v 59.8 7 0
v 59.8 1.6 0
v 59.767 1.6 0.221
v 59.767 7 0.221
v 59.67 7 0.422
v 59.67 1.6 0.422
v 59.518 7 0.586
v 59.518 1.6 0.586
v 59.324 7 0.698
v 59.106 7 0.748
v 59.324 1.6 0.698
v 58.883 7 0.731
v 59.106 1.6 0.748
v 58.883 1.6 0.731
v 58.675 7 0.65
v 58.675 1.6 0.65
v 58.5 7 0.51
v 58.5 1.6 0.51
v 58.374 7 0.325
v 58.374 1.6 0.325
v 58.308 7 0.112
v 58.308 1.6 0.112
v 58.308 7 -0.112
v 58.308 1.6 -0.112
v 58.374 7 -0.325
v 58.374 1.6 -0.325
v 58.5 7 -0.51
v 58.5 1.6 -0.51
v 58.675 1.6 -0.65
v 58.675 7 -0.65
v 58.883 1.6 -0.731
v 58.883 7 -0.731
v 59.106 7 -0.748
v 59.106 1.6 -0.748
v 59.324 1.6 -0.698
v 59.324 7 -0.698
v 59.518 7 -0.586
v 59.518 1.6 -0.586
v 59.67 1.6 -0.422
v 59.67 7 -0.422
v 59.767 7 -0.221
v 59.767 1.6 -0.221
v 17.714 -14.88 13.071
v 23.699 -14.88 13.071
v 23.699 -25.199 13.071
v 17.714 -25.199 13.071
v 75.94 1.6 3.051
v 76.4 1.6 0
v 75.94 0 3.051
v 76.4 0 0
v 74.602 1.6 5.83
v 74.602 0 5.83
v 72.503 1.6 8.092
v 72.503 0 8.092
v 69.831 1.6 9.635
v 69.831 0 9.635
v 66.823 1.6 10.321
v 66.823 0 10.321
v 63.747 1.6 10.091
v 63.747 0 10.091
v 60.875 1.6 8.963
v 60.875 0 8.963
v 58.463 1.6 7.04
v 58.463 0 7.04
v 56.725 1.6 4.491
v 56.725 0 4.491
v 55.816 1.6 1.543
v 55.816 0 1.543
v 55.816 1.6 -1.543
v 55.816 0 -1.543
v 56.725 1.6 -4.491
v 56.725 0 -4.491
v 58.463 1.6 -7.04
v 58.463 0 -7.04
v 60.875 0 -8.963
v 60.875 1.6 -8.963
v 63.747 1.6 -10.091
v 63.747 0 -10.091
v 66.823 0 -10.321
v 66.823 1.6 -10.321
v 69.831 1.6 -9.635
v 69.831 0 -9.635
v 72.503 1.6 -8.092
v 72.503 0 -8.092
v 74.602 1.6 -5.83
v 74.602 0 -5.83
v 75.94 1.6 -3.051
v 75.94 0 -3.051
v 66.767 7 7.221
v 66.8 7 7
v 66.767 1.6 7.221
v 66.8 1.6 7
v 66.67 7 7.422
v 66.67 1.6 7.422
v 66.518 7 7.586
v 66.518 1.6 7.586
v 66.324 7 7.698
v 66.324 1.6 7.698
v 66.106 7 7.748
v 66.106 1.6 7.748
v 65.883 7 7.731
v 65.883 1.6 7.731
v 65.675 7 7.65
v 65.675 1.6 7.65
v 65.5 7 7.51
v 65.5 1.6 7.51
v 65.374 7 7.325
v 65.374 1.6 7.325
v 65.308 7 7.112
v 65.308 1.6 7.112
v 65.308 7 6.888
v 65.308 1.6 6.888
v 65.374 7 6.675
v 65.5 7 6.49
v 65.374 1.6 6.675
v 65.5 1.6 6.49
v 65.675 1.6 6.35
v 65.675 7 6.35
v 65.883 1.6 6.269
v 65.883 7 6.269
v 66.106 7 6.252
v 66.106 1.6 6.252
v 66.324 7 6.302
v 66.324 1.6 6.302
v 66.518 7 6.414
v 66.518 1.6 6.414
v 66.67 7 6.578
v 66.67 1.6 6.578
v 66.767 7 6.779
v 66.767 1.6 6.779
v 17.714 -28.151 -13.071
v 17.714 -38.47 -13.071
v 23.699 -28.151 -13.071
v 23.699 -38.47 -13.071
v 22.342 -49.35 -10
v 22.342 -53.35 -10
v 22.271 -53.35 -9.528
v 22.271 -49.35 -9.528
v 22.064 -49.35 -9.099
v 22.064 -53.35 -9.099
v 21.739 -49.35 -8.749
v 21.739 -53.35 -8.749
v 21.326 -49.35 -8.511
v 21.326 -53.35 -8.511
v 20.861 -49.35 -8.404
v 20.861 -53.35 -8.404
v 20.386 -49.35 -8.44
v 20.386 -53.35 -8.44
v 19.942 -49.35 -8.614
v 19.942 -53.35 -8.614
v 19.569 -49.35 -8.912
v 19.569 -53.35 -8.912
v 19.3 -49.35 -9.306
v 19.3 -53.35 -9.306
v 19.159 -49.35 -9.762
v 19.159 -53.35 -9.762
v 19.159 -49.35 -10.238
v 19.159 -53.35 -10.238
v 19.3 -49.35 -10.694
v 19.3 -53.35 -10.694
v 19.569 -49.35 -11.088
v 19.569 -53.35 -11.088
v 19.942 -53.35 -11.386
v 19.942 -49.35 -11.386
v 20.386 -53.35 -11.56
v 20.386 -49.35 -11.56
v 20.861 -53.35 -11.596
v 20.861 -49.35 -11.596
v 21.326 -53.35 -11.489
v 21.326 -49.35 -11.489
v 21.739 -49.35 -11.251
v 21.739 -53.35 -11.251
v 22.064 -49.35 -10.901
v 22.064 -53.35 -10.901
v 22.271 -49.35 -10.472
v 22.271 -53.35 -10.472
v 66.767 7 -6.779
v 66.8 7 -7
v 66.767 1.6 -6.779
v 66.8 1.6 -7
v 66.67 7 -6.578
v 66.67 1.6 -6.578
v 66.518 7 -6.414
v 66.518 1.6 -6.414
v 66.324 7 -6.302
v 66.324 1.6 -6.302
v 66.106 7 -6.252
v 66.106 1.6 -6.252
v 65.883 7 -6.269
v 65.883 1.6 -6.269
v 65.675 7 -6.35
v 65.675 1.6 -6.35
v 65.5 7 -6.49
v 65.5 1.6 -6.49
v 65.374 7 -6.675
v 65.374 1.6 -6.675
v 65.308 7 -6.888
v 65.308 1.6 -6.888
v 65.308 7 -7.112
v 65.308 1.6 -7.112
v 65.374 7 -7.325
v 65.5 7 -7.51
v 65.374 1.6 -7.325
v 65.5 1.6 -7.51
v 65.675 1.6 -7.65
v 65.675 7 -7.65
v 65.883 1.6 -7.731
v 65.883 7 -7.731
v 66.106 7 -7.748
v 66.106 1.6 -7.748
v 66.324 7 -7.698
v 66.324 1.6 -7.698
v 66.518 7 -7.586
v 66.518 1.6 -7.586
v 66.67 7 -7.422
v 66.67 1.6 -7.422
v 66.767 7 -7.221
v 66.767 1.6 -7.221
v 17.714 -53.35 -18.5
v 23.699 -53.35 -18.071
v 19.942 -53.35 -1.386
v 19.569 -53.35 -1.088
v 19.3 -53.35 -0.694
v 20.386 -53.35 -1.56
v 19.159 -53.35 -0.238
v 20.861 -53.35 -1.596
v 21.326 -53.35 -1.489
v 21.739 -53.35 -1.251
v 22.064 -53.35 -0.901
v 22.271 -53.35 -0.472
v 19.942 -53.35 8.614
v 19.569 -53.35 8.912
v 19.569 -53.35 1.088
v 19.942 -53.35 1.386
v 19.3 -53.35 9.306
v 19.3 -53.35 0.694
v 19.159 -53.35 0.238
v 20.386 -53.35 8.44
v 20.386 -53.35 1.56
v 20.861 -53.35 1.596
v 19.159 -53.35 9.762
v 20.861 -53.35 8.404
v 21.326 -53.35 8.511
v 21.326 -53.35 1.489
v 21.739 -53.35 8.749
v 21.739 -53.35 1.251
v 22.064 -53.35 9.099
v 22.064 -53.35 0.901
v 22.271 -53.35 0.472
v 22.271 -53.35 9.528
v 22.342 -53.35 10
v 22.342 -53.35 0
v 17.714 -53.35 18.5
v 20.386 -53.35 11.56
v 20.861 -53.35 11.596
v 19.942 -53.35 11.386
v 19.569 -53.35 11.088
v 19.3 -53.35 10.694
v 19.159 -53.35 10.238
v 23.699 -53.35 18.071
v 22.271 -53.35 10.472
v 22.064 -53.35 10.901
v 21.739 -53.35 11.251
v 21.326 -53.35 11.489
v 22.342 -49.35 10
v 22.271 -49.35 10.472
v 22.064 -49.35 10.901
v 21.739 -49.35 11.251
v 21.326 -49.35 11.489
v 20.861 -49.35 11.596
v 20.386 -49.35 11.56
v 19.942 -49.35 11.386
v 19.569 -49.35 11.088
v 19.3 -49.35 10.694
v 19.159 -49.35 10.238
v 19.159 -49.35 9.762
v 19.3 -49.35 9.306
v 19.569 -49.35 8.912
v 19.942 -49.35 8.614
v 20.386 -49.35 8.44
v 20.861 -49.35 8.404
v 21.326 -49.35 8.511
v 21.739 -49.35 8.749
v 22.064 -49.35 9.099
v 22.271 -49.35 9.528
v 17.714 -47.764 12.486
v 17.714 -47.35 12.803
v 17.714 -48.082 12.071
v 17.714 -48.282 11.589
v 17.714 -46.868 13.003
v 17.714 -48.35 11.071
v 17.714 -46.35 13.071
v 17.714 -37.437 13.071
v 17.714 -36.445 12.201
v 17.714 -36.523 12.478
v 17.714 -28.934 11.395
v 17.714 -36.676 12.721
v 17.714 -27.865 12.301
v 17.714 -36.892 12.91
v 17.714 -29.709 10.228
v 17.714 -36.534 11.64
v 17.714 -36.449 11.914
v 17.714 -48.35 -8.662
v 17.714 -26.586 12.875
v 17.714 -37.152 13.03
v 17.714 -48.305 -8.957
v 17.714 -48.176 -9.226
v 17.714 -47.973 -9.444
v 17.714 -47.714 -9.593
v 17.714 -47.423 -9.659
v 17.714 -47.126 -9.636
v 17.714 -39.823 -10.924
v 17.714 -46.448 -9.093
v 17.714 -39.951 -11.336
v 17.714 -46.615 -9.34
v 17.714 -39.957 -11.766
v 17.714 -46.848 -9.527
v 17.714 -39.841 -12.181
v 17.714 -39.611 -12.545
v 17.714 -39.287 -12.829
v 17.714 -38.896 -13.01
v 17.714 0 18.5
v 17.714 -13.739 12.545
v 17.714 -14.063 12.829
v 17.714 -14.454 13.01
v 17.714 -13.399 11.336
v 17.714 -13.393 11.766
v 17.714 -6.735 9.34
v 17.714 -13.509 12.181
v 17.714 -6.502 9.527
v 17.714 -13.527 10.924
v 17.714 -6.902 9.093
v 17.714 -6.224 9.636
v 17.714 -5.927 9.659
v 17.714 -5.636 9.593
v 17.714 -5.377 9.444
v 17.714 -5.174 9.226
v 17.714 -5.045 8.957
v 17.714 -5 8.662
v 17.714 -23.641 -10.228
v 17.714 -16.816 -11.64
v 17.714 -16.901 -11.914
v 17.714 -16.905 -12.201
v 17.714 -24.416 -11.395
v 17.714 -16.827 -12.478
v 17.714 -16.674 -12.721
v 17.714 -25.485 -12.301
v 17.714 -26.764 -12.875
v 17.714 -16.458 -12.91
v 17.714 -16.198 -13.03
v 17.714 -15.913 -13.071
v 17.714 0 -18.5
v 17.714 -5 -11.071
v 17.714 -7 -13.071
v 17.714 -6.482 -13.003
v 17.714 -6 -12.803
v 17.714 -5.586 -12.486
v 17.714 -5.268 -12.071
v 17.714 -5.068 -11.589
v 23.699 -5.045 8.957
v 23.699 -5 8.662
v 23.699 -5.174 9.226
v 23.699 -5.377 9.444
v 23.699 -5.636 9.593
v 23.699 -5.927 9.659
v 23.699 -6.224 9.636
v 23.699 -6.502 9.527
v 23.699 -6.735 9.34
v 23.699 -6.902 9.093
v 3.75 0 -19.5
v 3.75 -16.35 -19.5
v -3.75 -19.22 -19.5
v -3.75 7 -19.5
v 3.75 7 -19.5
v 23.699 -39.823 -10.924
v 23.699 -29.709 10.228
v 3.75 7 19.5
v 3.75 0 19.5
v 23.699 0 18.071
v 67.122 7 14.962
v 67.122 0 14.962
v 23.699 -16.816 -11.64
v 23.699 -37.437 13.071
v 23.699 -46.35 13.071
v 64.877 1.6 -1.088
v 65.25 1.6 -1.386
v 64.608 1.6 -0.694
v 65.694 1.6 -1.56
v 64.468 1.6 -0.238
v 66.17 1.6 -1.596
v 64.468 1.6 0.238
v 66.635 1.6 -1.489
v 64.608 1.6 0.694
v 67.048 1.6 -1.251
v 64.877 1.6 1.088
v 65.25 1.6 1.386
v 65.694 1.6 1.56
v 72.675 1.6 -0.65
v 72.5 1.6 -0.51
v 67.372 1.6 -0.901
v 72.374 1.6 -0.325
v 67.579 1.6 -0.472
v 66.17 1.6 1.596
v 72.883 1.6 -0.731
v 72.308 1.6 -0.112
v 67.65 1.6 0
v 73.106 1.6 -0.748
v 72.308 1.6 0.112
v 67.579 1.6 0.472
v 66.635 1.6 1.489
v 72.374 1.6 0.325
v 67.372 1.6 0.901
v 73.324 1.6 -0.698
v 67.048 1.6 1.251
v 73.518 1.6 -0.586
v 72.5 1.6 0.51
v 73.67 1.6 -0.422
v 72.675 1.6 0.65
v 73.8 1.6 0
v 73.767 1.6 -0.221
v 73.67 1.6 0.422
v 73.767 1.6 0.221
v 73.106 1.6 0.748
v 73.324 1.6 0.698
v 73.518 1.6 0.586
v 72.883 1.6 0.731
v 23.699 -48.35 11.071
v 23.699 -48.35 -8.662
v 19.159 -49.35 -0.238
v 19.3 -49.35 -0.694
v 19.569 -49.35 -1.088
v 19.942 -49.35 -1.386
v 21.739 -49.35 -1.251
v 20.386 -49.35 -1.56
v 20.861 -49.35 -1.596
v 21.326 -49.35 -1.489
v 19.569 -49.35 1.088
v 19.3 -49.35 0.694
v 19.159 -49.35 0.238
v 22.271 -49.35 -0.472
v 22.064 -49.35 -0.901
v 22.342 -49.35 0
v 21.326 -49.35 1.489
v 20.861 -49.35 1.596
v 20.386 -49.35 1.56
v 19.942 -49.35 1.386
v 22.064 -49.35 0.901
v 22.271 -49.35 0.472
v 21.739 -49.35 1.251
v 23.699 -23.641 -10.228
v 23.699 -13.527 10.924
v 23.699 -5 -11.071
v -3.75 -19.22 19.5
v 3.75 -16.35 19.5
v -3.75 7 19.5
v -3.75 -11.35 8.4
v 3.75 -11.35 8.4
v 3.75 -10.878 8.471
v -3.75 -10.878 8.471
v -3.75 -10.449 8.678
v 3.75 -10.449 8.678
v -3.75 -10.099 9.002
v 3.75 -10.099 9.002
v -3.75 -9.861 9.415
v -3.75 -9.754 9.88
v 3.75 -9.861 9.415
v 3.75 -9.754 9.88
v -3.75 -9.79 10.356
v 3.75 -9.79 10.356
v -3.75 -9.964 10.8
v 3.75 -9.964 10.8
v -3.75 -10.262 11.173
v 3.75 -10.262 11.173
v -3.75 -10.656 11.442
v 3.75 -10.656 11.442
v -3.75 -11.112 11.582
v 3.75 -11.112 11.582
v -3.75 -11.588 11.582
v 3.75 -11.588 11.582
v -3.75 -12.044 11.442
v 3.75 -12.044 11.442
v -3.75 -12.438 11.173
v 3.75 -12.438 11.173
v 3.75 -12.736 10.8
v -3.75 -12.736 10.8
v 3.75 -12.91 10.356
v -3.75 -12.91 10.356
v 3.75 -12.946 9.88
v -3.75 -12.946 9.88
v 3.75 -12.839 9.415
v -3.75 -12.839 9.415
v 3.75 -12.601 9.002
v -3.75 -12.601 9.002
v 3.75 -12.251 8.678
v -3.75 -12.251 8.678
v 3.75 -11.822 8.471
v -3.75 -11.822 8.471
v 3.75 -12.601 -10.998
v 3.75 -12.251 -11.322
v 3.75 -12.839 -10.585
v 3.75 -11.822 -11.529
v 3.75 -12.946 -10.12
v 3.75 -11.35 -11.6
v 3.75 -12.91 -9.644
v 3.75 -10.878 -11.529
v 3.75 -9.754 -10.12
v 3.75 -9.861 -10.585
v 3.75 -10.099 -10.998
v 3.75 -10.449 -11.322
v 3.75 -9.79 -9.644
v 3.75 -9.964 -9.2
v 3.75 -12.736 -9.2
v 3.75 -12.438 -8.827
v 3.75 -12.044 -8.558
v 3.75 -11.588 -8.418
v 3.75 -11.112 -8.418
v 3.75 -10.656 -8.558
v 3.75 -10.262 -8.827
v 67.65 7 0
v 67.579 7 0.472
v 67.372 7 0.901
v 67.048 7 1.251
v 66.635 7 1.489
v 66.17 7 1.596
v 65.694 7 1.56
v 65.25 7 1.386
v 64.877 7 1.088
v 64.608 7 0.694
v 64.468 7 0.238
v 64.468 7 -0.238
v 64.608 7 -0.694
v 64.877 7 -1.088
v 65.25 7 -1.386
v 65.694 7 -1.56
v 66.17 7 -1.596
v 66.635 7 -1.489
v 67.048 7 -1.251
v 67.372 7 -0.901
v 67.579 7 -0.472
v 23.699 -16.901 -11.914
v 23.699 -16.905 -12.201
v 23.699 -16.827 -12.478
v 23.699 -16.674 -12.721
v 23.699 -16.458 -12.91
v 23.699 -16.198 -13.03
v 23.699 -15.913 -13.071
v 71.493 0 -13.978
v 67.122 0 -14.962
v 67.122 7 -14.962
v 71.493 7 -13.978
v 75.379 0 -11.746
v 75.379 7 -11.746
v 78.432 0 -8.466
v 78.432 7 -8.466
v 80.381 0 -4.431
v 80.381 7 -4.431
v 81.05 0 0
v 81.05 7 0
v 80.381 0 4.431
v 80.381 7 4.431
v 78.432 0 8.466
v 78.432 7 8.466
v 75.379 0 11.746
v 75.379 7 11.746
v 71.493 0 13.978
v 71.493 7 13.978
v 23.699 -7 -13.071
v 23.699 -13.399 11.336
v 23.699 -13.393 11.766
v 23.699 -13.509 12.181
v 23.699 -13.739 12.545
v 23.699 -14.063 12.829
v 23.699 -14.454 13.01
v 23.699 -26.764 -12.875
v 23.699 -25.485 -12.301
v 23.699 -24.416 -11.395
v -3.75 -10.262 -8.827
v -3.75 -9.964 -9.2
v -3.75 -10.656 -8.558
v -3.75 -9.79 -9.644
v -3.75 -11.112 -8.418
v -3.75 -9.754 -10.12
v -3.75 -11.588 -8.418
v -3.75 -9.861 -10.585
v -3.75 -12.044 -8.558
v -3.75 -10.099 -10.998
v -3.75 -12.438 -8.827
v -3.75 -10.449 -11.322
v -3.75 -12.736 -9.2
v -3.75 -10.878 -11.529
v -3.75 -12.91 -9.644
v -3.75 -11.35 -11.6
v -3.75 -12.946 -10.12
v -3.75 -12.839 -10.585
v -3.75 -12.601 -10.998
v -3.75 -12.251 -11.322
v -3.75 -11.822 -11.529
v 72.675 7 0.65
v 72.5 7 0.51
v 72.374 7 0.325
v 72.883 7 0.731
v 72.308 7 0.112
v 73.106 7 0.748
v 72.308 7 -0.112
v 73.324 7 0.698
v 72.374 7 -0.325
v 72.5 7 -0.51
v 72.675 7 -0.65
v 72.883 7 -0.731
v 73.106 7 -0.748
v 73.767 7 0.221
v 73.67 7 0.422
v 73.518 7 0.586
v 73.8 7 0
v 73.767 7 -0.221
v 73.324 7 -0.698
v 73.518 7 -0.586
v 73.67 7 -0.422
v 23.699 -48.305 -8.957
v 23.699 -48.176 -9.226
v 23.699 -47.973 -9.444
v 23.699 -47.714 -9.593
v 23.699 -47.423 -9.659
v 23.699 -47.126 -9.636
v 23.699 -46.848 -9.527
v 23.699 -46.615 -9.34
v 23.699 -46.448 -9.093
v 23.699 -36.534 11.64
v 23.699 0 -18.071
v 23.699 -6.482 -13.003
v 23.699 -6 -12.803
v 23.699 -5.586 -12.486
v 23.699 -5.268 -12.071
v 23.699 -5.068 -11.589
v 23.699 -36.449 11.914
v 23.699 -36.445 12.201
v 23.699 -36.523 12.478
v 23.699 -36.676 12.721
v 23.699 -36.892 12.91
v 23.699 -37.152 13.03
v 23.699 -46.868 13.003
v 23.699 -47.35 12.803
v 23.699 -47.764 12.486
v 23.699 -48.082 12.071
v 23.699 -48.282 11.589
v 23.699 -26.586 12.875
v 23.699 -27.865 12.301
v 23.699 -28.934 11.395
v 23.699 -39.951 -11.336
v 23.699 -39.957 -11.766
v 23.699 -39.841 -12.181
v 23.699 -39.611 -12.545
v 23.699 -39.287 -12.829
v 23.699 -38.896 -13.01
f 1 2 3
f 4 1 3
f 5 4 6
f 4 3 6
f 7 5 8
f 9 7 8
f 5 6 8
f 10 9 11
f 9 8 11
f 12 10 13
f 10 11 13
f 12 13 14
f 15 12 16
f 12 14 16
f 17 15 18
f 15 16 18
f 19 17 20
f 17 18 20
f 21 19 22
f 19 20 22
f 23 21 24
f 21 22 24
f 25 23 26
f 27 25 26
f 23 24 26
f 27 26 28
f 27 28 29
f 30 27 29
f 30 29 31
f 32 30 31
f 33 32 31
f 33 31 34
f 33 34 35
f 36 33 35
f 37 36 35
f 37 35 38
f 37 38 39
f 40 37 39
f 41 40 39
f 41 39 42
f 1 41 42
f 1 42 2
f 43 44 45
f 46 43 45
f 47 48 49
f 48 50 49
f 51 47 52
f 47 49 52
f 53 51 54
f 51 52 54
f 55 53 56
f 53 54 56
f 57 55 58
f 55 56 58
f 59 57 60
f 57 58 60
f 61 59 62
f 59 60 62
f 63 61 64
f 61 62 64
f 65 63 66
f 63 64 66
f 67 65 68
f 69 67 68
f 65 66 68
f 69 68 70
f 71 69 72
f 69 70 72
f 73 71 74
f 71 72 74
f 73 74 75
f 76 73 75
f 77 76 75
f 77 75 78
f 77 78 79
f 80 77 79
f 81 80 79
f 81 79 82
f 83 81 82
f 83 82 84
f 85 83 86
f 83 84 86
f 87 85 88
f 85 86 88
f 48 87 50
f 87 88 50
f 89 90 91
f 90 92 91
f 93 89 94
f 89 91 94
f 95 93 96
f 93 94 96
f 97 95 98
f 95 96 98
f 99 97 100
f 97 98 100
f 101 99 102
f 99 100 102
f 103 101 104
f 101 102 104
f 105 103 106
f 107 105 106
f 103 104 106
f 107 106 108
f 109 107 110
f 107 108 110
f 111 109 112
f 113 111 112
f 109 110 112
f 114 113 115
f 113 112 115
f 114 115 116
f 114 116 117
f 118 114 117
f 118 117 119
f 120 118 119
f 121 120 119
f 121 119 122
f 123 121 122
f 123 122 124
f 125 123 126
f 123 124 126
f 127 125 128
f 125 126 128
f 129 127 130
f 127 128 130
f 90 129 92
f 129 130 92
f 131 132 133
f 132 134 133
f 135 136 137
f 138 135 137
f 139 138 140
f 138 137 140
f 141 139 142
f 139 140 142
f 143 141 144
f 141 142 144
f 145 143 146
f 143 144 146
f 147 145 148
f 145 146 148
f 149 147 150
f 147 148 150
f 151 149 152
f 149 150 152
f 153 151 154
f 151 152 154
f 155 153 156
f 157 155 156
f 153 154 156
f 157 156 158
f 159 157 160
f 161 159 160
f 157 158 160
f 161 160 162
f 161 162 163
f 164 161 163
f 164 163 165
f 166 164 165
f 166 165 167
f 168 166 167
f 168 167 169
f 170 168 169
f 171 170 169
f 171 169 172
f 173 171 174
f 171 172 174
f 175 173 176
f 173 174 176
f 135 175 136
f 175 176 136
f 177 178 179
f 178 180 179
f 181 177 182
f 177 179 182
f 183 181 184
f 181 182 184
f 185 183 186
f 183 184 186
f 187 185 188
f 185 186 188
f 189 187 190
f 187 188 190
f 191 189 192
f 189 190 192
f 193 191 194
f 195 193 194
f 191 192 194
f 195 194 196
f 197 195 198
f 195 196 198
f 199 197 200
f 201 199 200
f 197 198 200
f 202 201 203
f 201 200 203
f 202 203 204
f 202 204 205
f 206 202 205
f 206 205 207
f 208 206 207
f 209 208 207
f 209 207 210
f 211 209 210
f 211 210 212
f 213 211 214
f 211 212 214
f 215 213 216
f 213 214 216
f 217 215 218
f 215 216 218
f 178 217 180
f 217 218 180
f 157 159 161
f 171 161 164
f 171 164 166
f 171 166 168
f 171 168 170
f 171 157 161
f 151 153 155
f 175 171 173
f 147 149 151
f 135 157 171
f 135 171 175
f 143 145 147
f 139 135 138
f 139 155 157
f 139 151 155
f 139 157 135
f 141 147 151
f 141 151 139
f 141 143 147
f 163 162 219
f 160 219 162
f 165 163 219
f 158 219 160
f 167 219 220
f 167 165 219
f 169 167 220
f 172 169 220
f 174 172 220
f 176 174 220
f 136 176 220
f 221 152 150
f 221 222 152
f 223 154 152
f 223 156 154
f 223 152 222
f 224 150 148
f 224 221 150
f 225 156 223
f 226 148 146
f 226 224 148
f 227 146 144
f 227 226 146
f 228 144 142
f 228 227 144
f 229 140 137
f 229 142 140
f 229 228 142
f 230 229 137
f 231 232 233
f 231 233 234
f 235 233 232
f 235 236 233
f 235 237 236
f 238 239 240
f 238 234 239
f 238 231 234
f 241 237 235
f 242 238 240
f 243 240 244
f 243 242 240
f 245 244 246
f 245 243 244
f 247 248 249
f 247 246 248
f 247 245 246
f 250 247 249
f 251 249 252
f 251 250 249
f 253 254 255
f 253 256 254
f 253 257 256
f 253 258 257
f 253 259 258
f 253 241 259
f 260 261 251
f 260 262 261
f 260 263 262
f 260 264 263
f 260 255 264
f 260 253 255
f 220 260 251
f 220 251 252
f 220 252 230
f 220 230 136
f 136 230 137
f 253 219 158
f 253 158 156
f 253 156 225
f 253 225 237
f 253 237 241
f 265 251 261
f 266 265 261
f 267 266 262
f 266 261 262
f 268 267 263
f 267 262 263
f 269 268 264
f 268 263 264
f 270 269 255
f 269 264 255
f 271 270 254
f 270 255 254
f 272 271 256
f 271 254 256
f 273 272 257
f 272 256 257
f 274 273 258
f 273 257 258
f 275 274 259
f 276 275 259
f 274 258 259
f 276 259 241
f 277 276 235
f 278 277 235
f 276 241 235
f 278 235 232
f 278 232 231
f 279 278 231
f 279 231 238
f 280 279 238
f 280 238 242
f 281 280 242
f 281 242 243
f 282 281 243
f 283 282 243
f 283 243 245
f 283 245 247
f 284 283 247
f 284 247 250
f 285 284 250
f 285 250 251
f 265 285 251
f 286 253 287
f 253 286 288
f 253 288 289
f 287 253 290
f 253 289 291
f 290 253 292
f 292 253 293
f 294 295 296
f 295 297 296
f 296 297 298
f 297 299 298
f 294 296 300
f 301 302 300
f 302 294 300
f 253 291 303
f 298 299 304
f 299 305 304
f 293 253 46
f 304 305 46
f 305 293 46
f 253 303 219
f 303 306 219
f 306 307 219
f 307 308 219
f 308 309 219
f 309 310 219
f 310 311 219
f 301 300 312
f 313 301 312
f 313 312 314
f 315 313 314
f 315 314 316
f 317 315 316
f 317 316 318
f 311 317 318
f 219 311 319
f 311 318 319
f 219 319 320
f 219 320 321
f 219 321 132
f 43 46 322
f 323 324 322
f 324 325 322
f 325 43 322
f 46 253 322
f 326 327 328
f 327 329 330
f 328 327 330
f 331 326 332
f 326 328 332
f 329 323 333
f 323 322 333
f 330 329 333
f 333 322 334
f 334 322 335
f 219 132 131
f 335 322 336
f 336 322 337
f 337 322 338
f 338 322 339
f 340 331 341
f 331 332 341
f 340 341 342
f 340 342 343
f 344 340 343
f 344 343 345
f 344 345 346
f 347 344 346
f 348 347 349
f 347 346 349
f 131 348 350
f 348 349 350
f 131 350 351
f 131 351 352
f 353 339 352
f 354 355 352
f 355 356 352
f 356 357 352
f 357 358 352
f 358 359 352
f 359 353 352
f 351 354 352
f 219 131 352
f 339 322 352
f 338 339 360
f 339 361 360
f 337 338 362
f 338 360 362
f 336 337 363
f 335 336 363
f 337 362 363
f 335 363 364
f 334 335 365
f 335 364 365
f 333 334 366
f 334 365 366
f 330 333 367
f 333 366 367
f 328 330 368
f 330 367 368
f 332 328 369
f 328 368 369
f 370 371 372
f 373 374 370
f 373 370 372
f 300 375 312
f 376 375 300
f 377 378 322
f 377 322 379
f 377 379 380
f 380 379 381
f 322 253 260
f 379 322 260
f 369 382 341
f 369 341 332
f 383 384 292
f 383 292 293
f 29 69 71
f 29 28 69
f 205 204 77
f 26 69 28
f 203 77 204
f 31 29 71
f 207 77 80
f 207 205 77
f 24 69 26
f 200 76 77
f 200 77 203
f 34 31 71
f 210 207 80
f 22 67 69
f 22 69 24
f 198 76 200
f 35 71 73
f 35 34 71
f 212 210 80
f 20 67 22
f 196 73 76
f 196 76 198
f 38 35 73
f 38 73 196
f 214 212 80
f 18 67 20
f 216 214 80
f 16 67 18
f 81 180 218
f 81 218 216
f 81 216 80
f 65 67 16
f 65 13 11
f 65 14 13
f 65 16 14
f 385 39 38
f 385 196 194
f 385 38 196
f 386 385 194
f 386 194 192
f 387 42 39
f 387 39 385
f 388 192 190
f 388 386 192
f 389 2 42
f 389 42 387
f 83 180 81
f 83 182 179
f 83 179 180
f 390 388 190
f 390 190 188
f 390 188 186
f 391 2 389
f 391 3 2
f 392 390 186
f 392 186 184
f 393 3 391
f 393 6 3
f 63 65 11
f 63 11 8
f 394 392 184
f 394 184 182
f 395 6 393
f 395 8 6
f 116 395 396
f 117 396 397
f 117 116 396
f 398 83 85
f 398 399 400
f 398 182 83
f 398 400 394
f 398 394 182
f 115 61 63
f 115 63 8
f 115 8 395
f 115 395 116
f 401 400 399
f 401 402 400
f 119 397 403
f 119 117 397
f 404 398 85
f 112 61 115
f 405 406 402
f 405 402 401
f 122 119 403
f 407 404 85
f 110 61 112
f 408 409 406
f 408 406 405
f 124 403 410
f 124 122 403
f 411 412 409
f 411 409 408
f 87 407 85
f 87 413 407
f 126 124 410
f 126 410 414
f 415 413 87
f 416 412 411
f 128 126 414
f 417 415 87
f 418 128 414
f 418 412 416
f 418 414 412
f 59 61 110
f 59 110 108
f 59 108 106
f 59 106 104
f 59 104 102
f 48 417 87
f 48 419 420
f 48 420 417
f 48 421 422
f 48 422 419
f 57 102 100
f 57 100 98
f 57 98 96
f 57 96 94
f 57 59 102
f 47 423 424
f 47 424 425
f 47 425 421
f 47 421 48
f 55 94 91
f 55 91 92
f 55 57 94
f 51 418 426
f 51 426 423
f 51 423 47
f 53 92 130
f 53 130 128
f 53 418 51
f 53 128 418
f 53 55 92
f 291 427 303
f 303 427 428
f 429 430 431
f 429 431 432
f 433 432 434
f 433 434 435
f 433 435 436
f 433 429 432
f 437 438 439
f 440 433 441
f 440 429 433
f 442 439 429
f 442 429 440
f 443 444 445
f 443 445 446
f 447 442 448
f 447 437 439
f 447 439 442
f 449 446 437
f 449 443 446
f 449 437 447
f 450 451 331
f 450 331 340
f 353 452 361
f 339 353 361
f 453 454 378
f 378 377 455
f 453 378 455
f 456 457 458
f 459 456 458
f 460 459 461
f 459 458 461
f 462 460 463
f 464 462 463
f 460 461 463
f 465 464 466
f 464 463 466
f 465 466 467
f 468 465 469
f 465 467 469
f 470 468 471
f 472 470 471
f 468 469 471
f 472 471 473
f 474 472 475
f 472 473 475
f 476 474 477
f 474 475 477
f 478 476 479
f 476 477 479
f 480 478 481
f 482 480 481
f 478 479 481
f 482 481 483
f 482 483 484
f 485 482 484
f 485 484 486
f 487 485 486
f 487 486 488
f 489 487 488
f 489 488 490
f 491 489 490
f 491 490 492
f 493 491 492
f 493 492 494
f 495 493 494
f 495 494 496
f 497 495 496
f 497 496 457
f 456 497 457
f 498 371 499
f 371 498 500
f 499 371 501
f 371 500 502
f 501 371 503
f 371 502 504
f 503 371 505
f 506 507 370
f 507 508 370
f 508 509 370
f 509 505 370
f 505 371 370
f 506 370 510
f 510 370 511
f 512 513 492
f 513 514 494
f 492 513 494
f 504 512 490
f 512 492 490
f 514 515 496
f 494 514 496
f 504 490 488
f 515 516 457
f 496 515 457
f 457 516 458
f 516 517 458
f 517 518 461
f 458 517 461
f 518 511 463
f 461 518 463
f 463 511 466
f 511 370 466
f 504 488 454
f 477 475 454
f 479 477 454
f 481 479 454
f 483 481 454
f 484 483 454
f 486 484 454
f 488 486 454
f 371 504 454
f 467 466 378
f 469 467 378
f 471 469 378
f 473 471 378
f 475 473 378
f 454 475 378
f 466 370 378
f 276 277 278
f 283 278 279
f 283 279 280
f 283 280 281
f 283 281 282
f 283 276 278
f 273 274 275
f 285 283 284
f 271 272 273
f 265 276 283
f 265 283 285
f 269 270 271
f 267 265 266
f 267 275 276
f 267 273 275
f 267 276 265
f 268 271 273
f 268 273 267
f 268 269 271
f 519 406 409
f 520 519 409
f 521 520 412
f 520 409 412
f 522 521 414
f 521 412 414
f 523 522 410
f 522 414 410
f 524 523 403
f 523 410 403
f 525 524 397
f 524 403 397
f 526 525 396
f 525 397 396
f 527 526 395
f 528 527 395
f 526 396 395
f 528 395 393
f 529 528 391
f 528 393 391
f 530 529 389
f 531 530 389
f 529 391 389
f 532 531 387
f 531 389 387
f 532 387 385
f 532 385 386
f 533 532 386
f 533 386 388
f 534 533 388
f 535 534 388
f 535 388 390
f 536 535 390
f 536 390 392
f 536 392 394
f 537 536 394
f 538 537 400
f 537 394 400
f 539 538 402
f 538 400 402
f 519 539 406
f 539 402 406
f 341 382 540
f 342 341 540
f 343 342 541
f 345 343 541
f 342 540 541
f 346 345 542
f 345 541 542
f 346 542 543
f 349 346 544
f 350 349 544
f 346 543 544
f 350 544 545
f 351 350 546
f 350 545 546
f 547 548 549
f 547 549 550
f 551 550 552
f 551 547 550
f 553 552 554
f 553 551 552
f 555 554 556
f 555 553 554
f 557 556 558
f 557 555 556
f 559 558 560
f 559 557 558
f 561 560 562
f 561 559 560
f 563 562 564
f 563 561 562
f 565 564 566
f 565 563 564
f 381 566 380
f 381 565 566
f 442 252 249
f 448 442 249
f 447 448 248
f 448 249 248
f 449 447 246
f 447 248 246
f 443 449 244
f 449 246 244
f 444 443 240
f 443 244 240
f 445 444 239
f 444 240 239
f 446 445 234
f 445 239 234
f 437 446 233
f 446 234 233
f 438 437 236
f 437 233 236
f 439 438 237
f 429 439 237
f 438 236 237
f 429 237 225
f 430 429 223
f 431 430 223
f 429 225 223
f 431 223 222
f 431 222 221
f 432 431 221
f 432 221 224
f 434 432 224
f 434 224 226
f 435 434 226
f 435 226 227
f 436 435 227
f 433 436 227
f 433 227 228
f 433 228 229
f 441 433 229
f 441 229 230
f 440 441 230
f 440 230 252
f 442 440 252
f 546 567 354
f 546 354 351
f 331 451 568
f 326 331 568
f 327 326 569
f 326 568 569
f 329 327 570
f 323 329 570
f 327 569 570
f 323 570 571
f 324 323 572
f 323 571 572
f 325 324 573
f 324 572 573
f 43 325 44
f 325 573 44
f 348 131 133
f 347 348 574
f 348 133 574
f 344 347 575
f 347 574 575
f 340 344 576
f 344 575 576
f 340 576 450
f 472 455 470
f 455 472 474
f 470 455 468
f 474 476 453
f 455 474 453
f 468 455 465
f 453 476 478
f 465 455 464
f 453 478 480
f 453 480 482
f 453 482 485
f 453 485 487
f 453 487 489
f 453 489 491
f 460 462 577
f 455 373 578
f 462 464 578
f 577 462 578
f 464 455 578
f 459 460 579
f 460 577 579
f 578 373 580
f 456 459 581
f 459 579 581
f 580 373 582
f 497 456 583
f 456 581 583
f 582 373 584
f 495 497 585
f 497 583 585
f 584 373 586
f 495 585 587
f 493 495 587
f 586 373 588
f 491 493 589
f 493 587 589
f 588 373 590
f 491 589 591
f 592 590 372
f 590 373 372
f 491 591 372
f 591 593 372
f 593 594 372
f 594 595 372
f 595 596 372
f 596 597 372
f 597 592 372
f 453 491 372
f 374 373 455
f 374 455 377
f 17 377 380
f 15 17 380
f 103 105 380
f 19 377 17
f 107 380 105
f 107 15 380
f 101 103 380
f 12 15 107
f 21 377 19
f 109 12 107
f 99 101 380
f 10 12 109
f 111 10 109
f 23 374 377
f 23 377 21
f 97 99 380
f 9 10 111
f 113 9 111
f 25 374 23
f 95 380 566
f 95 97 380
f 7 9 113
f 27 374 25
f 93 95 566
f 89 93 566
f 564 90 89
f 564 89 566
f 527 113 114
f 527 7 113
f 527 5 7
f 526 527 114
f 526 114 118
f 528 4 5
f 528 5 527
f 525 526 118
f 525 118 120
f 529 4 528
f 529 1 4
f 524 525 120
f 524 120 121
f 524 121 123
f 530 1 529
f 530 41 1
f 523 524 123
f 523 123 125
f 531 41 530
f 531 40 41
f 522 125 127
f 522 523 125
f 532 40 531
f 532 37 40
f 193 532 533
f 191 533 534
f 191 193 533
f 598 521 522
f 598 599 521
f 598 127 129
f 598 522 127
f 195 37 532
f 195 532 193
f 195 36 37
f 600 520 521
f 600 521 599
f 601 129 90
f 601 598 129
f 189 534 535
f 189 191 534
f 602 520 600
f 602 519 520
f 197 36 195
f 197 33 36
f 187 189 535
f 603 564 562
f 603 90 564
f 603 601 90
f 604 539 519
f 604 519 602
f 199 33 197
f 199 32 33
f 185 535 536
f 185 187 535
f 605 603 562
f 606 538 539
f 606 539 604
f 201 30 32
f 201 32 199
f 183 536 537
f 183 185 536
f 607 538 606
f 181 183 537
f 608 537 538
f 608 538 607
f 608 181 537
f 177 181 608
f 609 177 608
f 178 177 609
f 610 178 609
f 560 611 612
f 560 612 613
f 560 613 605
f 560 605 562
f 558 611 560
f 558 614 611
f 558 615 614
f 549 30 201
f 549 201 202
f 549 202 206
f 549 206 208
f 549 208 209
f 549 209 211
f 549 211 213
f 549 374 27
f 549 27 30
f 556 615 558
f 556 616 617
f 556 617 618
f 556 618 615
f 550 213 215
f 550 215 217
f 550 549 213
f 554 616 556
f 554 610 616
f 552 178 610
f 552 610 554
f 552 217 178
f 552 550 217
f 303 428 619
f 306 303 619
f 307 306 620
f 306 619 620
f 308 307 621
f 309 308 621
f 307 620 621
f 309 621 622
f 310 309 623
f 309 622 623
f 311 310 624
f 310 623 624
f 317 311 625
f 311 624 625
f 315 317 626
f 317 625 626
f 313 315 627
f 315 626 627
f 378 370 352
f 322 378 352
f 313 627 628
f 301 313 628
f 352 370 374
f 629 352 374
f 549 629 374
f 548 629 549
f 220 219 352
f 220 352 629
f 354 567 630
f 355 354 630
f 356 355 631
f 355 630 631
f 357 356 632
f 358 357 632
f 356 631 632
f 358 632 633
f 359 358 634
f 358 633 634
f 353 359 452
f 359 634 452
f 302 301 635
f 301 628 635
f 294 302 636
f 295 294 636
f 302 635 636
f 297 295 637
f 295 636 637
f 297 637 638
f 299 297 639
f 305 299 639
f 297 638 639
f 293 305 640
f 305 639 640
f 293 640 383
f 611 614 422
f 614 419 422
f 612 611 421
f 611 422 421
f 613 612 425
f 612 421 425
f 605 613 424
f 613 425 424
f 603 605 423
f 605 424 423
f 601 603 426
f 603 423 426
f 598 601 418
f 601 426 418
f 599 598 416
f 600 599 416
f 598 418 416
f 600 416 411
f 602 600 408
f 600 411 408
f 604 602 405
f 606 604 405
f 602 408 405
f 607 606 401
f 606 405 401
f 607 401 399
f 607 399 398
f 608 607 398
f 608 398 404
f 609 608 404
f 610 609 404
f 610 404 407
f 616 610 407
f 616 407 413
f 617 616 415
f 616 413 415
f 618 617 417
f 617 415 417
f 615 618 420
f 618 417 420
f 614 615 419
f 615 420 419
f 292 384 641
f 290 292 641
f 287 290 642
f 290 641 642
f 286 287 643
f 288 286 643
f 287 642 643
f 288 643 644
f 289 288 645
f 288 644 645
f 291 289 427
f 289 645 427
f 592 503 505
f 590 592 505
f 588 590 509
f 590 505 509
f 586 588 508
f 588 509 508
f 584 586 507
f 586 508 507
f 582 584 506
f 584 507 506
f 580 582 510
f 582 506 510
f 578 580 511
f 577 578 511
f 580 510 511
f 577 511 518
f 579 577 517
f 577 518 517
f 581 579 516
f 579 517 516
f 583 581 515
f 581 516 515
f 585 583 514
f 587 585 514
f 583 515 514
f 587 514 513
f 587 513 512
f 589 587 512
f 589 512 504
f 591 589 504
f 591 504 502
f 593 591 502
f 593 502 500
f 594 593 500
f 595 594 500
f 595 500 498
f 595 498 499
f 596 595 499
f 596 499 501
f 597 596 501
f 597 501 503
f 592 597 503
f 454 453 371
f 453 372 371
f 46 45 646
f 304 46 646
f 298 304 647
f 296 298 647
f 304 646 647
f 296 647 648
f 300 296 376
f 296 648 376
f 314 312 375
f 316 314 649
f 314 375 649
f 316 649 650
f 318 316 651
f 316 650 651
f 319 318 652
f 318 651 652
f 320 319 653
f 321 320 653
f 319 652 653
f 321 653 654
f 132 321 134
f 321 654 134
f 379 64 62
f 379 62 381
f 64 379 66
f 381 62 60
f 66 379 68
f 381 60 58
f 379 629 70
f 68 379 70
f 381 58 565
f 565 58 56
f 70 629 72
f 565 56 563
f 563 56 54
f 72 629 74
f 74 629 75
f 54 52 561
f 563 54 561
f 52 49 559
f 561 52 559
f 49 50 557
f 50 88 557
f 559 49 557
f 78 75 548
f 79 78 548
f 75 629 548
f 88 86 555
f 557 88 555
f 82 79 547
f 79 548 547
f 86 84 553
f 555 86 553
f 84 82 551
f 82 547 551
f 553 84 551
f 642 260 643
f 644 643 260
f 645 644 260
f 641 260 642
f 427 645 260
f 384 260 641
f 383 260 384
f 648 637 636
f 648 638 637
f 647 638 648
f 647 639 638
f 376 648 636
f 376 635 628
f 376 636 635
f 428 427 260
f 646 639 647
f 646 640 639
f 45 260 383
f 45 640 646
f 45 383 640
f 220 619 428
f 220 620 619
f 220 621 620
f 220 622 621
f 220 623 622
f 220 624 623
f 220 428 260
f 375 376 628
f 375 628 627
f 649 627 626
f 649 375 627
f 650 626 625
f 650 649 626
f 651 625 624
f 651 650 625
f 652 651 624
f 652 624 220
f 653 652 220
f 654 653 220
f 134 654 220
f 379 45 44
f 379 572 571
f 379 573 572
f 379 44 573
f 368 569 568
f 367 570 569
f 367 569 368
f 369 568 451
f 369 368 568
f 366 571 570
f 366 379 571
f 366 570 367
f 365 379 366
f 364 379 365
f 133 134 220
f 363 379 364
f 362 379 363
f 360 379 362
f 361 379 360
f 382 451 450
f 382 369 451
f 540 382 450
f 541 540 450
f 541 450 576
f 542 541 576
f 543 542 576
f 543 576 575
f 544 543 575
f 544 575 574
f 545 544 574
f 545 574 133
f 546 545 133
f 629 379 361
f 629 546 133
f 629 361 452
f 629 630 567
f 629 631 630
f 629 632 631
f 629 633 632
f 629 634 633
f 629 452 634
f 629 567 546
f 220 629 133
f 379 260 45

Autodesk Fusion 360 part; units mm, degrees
sketch "Sketch1" plane through (0, 0, 0) normal (0, 1, 0) x (1, 0, 0)
  line L0 (3.75, -19.5) -> (-3.75, -19.5)
  line L1 (-3.75, -19.5) -> (-3.75, 19.5)
  line L2 (-3.75, 19.5) -> (3.75, 19.5)
  line L3 (3.75, 19.5) -> (3.75, -19.5)
  line L4 (3.75, -19.5) -> (-3.75, 19.5) construction
  line L5 (-3.75, -19.5) -> (3.75, 19.5) construction
  circle A0 centre (66.05, 0) radius 15
  line L6 (3.75, -19.5) -> (67.1215, -14.9617)
  line L7 (3.75, 19.5) -> (67.1215, 14.9617)
  dimension "d1" = 7.5
  dimension "d2" = 39
  dimension "d4" = 30
extrude "Extrude1" add sketch "Sketch1" along normal blind 7
sketch "Sketch2" plane through (0, 7, 0) normal (0, 1, 0) x (-1, 0, 0)
  line L0 (-3.75, 19.5) -> (-67.1215, 14.9617)
  arc A0 (-67.1215, 14.9617) -> (-67.1215, -14.9617) centre (-66.05, 0) ccw
  line L1 (-67.1215, -14.9617) -> (-3.75, -19.5)
  line L2 (-3.75, -19.5) -> (3.75, -19.5)
  line L3 (3.75, -19.5) -> (3.75, 19.5)
  line L4 (3.75, 19.5) -> (-3.75, 19.5)
  line L5 (3.75, -19.5) -> (-3.75, -19.5)
  line L6 (-3.75, -19.5) -> (-3.75, 19.5)
  line L7 (-3.75, 19.5) -> (3.75, 19.5)
  line L8 (3.75, 19.5) -> (3.75, -19.5)
extrude "Extrude2" add sketch "Sketch2" against normal blind 23.35 contours L2 L3 L4 L5 L6 L7 L8
sketch "Sketch3" plane through (0, 0, -19.5) normal (0, 0, -1) x (-1, 0, 0)
  line L0 (3.75, -16.35) -> (3.75, 7)
  line L1 (3.75, 7) -> (-3.75, 7)
  line L2 (-3.75, 7) -> (-3.75, 0)
  line L3 (-3.75, 0) -> (-3.75, -16.35)
  line L4 (-3.75, -16.35) -> (3.75, -16.35)
  line L5 (3.75, -16.35) -> (3.75, -19.22)
  line L6 (3.75, -19.22) -> (-3.75, -16.35)
  dimension "d9" = 2.87
extrude "Extrude3" add sketch "Sketch3" against normal blind 39 contours L4 L5 L6
sketch "Sketch4" plane through (0, 0, 0) normal (0, -1, 0) x (1, 0, 0)
  line L0 (3.75, 19.5) -> (3.75, -19.5)
  line L1 (3.75, -19.5) -> (67.1215, -14.9617)
  arc A0 (67.1215, -14.9617) -> (67.1215, 14.9617) centre (66.05, 0) ccw
  line L2 (67.1215, 14.9617) -> (3.75, 19.5)
  line L3 (3.75, -19.5) -> (17.7142, -18.5)
  line L4 (17.7142, -18.5) -> (23.6989, -18.0714)
  line L5 (3.75, 19.5) -> (17.7142, 18.5)
  line L6 (17.7142, 18.5) -> (23.6989, 18.0714)
  line L7 (23.6989, 18.0714) -> (23.6989, -18.0714)
  line L8 (17.7142, 18.5) -> (17.7142, -18.5)
  dimension "d12" = 14
  dimension "d13" = 6
  dimension "d14" = 14
  dimension "d15" = 6
extrude "Extrude4" add sketch "Sketch4" along normal blind 53.35 contours L1 L2 L4 L6 L7 L8
sketch "Sketch5" plane through (23.6989, 0, 0) normal (1, 0, 0) x (0, 0, -1)
  line L0 (18.0714, 0) -> (-18.0714, 0)
  line L1 (-18.0714, 0) -> (-18.0714, -53.35)
  line L2 (-18.0714, -53.35) -> (18.0714, -53.35)
  line L3 (18.0714, -53.35) -> (18.0714, 0)
  line L4 (-11.0714, -48.35) -> (8.6618, -48.35)
  line L5 (11.0714, -5) -> (-8.6618, -5)
  line L6 (13.0714, -7) -> (13.0714, -17.5)
  line L7 (11.64, -16.8156) -> (-9.0931, -6.9022)
  line L8 (-13.0714, -46.35) -> (-13.0714, -35.85)
  line L9 (9.0931, -46.4478) -> (-11.64, -36.5344)
  line L10 (10.9243, -39.8234) -> (-10.2282, -29.7094)
  line L11 (-10.9243, -13.5266) -> (10.2282, -23.6406)
  line L12 (13.0714, -38.4701) -> (13.0714, -28.1514)
  line L13 (13.0714, -15.9134) -> (13.0714, -5)
  line L14 (-13.0714, -14.8799) -> (-13.0714, -25.1986)
  line L15 (-13.0714, -37.4366) -> (-13.0714, -48.35)
  arc A0 (8.6618, -48.35) -> (9.0931, -46.4478) centre (8.6618, -47.35) ccw
  arc A1 (-11.64, -36.5344) -> (-13.0714, -37.4366) centre (-12.0714, -37.4366) ccw
  arc A2 (11.64, -16.8156) -> (13.0714, -15.9134) centre (12.0714, -15.9134) ccw
  arc A3 (-8.6618, -5) -> (-9.0931, -6.9022) centre (-8.6618, -6) ccw
  arc A4 (13.0714, -7) -> (11.0714, -5) centre (11.0714, -7) ccw
  arc A5 (-13.0714, -46.35) -> (-11.0714, -48.35) centre (-11.0714, -46.35) ccw
  arc A6 (10.9243, -39.8234) -> (13.0714, -38.4701) centre (11.5714, -38.4701) ccw
  arc A7 (-10.9243, -13.5266) -> (-13.0714, -14.8799) centre (-11.5714, -14.8799) ccw
  arc A8 (13.0714, -28.1514) -> (10.2282, -23.6406) centre (8.0714, -28.1514) ccw
  arc A9 (-13.0714, -25.1986) -> (-10.2282, -29.7094) centre (-8.0714, -25.1986) ccw
  point P0 (-13.0714, -5)
  point P1 (13.0714, -48.35)
  point P2 (13.0714, -25)
  point P3 (-13.0714, -28.35)
  point P4 (13.0714, -40.85)
  point P5 (-13.0714, -12.5)
  dimension "d19" = 12.5
  dimension "d20" = 7.5
  dimension "d21" = 12.5
  dimension "d22" = 7.5
  dimension "d23" = 7.5
  dimension "d24" = 7.5
  dimension "d25" = 1
  dimension "d26" = 2
  dimension "d27" = 1.5
  dimension "d28" = 5
extrude "Extrude5" cut sketch "Sketch5" against normal blind 9 contours L4 L8 L9 L15 A0 A1 A5 | L5 L6 L7 L13 A2 A3 A4 | L10 L11 L12 L14 A6 A7 A8 A9
sketch "Sketch6" plane through (0, 0, 0) normal (0, -1, 0) x (1, 0, 0)
  line L0 (23.6989, 18.0714) -> (23.6989, -18.0714)
  line L1 (23.6989, -18.0714) -> (67.1215, -14.9617)
  arc A0 (67.1215, -14.9617) -> (67.1215, 14.9617) centre (66.05, 0) ccw
  line L2 (67.1215, 14.9617) -> (23.6989, 18.0714)
  circle A1 centre (66.05, 0) radius 10.35
  dimension "d31" = 20.7
extrude "Extrude6" cut sketch "Sketch6" against normal blind 1.6 contours A1
sketch "Sketch7" plane through (0, 1.6, 0) normal (0, -1, 0) x (1, 0, 0)
  circle A0 centre (66.05, 0) radius 10.35
  circle A1 centre (66.05, 0) radius 1.6
  line L0 (66.05, 0) -> (59.05, 0)
  line L1 (66.05, 0) -> (73.05, 0)
  line L2 (66.05, 0) -> (66.05, -7)
  line L3 (66.05, 0) -> (66.05, 7)
  circle A2 centre (59.05, 0) radius 0.75
  circle A3 centre (66.05, 7) radius 0.75
  circle A4 centre (73.05, 0) radius 0.75
  circle A5 centre (66.05, -7) radius 0.75
  dimension "d34" = 3.2
  dimension "d35" = 7
  dimension "d36" = 7
  dimension "d37" = 7
  dimension "d38" = 7
  dimension "d39" = 1.5
  dimension "d40" = 1.5
  dimension "d41" = 1.5
  dimension "d42" = 1.5
extrude "Extrude7" cut sketch "Sketch7" against normal blind 13 contours A1 L1 L3 | A5 | A2 | A3 | A1 L1 L2 | A4 | A1 L0 L3 | A1 L0 L2
sketch "Sketch8" plane through (3.75, 0, 0) normal (1, 0, 0) x (0, 0, -1)
  line L0 (19.5, 0) -> (-19.5, 0)
  line L1 (-19.5, 0) -> (-19.5, -16.35)
  line L2 (-19.5, -16.35) -> (19.5, -16.35)
  line L3 (19.5, -16.35) -> (19.5, 0)
  line L4 (19.5, -16.35) -> (10, -16.35)
  line L5 (10, -16.35) -> (10, -11.35)
  circle A0 centre (10, -11.35) radius 1.6
  line L6 (10, -11.35) -> (-10, -11.35)
  circle A1 centre (-10, -11.35) radius 1.6
  dimension "d45" = 9.5
  dimension "d46" = 5
  dimension "d47" = 3.2
  dimension "d48" = 20
  dimension "d49" = 3.2
extrude "Extrude8" cut sketch "Sketch8" against normal blind 19 contours A1 | L5 A0 L6 | L5 A0 L6
sketch "Sketch9" plane through (0, -53.35, 0) normal (0, -1, 0) x (1, 0, 0)
  line L0 (23.6989, 18.0714) -> (17.7142, 18.5)
  line L1 (17.7142, 18.5) -> (17.7142, -18.5)
  line L2 (17.7142, -18.5) -> (23.6989, -18.0714)
  line L3 (23.6989, -18.0714) -> (23.6989, 18.0714)
  circle A0 centre (20.7416, 0) radius 1.6
  circle A1 centre (20.7416, 10) radius 1.6
  circle A2 centre (20.7416, -10) radius 1.6
  dimension "d52" = 3.2
  dimension "d53" = 10
  dimension "d54" = 10
  dimension "d55" = 3.2
  dimension "d56" = 3.2
extrude "Extrude9" cut sketch "Sketch9" against normal blind 4 contours A0 | A1 | A2
